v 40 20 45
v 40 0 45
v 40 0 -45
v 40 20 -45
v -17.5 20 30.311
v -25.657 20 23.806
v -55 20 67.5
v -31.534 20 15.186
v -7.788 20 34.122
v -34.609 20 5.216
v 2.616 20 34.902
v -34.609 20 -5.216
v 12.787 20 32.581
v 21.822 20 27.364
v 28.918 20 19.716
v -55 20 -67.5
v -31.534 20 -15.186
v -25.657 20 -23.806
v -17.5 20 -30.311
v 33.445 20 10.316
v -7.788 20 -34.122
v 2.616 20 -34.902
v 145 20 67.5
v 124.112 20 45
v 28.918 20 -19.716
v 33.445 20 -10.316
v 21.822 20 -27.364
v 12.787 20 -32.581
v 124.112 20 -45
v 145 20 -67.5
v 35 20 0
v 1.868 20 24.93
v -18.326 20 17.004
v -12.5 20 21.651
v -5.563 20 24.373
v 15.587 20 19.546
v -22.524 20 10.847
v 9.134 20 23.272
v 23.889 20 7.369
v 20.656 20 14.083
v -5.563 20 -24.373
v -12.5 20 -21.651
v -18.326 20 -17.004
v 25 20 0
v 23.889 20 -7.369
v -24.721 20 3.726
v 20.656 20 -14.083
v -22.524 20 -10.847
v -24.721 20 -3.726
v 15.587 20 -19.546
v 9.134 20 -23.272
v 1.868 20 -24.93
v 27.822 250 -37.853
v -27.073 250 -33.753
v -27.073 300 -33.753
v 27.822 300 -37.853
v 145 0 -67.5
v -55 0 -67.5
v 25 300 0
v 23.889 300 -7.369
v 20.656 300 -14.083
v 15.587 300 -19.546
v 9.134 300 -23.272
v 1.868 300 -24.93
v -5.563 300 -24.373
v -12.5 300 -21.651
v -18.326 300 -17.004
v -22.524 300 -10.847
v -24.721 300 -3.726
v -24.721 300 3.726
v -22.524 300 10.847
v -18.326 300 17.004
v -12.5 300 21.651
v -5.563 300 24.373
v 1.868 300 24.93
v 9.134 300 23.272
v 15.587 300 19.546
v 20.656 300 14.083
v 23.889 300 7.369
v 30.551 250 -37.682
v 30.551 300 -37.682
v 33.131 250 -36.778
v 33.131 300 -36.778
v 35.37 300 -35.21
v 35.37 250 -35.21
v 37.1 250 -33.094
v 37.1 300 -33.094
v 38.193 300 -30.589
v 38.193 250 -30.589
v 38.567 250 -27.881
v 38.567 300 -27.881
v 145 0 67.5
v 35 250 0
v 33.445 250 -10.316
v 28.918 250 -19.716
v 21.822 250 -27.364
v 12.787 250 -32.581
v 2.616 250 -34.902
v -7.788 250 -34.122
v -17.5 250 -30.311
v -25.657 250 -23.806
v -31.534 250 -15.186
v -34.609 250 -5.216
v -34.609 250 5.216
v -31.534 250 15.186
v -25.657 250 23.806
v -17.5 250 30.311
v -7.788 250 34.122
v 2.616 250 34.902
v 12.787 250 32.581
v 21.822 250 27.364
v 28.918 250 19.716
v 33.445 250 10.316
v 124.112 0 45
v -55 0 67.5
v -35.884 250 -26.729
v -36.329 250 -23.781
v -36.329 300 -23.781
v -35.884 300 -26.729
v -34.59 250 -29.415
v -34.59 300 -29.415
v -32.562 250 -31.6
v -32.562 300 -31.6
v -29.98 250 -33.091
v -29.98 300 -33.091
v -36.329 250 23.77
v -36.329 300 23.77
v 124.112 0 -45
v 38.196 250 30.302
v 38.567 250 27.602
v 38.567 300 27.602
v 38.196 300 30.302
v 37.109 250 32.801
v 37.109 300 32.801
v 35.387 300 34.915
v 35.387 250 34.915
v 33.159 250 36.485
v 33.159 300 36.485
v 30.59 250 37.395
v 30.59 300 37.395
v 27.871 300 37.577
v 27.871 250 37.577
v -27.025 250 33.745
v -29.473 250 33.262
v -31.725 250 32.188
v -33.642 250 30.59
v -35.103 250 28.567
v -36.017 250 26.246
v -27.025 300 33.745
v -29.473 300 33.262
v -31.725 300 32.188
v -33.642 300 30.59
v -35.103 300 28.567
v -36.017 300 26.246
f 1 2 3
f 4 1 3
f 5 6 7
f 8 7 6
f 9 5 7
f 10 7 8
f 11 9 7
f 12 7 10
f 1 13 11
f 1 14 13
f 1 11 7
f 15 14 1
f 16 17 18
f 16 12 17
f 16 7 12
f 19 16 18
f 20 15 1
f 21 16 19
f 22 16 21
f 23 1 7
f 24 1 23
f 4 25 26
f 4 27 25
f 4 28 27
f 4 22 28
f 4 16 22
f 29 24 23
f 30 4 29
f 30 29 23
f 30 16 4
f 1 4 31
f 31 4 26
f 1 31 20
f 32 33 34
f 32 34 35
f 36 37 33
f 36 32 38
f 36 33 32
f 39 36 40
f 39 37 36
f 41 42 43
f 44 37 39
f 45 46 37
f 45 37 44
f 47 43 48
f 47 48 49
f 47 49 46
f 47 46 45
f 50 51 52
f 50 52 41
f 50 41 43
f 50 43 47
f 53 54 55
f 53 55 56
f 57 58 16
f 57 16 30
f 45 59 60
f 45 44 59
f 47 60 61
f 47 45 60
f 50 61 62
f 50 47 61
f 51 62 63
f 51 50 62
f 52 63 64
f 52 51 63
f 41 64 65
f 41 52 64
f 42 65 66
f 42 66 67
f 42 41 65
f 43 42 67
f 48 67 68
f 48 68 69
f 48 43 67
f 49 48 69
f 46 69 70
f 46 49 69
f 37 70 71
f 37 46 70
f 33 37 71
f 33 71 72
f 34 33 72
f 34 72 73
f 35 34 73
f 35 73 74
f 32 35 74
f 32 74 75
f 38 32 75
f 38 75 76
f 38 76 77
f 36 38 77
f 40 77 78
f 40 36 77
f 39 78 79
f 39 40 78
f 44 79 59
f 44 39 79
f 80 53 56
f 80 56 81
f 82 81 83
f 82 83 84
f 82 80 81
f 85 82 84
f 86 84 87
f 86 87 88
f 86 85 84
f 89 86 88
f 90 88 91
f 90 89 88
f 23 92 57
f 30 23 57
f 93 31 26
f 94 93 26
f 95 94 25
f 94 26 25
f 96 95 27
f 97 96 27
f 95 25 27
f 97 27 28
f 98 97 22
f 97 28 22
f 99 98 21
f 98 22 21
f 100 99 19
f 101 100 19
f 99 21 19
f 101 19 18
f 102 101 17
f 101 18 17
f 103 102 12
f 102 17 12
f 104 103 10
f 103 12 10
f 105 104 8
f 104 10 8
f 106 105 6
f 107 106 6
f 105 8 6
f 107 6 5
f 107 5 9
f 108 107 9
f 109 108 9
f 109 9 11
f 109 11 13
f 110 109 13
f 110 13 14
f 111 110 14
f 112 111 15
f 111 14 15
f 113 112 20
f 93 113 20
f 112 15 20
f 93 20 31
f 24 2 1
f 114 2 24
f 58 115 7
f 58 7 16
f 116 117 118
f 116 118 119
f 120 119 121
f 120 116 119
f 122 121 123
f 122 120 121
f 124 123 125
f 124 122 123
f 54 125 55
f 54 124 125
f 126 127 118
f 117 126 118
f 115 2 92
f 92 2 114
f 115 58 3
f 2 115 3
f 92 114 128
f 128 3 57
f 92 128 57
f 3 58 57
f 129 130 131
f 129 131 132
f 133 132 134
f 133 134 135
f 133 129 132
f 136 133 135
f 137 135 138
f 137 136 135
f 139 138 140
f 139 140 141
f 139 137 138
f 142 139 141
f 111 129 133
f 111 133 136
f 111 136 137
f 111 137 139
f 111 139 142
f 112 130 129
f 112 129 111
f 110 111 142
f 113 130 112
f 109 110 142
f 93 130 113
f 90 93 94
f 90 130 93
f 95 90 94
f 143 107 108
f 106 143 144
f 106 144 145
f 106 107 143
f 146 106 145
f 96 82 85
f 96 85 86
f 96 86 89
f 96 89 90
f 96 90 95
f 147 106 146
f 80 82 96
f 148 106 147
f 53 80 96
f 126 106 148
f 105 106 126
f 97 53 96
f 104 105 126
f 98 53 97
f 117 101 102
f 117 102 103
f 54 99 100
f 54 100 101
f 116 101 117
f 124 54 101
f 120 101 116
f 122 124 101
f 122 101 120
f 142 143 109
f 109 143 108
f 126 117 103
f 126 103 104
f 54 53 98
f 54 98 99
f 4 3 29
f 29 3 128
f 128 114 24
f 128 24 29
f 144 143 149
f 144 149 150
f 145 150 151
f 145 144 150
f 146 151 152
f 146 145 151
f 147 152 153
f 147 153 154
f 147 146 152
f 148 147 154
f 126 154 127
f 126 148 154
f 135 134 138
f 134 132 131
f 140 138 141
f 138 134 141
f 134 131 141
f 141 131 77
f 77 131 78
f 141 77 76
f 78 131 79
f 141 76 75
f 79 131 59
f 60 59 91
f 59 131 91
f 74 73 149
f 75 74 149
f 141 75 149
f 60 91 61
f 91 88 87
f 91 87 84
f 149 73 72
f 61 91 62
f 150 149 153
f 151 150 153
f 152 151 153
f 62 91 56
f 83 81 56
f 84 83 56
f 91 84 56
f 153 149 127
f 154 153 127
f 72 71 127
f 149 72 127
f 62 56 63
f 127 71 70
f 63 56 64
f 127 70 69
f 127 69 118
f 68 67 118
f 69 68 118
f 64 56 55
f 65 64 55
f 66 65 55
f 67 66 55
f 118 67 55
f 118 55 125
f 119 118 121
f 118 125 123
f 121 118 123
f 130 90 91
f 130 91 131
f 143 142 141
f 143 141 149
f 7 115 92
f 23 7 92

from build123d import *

# Parameters (mm, degrees)
SKETCH_1_W        = 200
SKETCH_1_H        = 135
SKETCH_1_W_2      = 84.112104212
SKETCH_1_H_2      = 90
EXTRUDE_1_DEPTH   = 20
SKETCH_3_R        = 35
SKETCH_3_R_2      = 25
EXTRUDE_1_2_DEPTH = 230
SKETCH_4_R        = 25
EXTRUDE_2_DEPTH   = 50


with BuildPart() as part:
    # Эскиз1 → Extrude 1 (new body)
    with BuildSketch(Plane(origin=(0, 0, 0), x_dir=(1, 0, 0), z_dir=(0, 1, 0))):
        with Locations((45, 0)):
            Rectangle(SKETCH_1_W, SKETCH_1_H)
        with Locations((82.056052106, 0)):
            Rectangle(SKETCH_1_W_2, SKETCH_1_H_2, mode=Mode.SUBTRACT)
    extrude(amount=EXTRUDE_1_DEPTH)

    # Эскиз3 → Extrude 1 2 (add)
    with BuildSketch(Plane(origin=(0, 20, 0), x_dir=(1, 0, 0), z_dir=(0, 1, 0))):
        Circle(SKETCH_3_R)
        Circle(SKETCH_3_R_2, mode=Mode.SUBTRACT)
    extrude(amount=EXTRUDE_1_2_DEPTH)

    # Эскиз4 → Бобышка-Вытянуть2 (add)
    with BuildSketch(Plane(origin=(0, 250, 0), x_dir=(1, 0, 0), z_dir=(0, 1, 0))):
        with BuildLine():
            Line((38.567048096, 27.880540306), (38.567048096, -27.601676263))
            ThreePointArc((38.567048096, -27.601676263), (35.38747425, -34.914800567), (27.87069068, -37.577401116))
            Line((27.87069068, -37.577401116), (-27.024888661, -33.745404507))
            ThreePointArc((-27.024888661, -33.745404507), (-33.641655548, -30.590105807), (-36.328531244, -23.769679653))
            Line((-36.328531244, -23.769679653), (-36.328531244, 23.781195095))
            ThreePointArc((-36.328531244, 23.781195095), (-33.658156001, 30.583885807), (-27.07321106, 33.753429146))
            Line((-27.07321106, 33.753429146), (27.822368281, 37.852774357))
            ThreePointArc((27.822368281, 37.852774357), (35.369738808, 35.210165063), (38.567048096, 27.880540306))
        make_face()
        Circle(SKETCH_4_R, mode=Mode.SUBTRACT)
    extrude(amount=EXTRUDE_2_DEPTH)


solid = part.part
